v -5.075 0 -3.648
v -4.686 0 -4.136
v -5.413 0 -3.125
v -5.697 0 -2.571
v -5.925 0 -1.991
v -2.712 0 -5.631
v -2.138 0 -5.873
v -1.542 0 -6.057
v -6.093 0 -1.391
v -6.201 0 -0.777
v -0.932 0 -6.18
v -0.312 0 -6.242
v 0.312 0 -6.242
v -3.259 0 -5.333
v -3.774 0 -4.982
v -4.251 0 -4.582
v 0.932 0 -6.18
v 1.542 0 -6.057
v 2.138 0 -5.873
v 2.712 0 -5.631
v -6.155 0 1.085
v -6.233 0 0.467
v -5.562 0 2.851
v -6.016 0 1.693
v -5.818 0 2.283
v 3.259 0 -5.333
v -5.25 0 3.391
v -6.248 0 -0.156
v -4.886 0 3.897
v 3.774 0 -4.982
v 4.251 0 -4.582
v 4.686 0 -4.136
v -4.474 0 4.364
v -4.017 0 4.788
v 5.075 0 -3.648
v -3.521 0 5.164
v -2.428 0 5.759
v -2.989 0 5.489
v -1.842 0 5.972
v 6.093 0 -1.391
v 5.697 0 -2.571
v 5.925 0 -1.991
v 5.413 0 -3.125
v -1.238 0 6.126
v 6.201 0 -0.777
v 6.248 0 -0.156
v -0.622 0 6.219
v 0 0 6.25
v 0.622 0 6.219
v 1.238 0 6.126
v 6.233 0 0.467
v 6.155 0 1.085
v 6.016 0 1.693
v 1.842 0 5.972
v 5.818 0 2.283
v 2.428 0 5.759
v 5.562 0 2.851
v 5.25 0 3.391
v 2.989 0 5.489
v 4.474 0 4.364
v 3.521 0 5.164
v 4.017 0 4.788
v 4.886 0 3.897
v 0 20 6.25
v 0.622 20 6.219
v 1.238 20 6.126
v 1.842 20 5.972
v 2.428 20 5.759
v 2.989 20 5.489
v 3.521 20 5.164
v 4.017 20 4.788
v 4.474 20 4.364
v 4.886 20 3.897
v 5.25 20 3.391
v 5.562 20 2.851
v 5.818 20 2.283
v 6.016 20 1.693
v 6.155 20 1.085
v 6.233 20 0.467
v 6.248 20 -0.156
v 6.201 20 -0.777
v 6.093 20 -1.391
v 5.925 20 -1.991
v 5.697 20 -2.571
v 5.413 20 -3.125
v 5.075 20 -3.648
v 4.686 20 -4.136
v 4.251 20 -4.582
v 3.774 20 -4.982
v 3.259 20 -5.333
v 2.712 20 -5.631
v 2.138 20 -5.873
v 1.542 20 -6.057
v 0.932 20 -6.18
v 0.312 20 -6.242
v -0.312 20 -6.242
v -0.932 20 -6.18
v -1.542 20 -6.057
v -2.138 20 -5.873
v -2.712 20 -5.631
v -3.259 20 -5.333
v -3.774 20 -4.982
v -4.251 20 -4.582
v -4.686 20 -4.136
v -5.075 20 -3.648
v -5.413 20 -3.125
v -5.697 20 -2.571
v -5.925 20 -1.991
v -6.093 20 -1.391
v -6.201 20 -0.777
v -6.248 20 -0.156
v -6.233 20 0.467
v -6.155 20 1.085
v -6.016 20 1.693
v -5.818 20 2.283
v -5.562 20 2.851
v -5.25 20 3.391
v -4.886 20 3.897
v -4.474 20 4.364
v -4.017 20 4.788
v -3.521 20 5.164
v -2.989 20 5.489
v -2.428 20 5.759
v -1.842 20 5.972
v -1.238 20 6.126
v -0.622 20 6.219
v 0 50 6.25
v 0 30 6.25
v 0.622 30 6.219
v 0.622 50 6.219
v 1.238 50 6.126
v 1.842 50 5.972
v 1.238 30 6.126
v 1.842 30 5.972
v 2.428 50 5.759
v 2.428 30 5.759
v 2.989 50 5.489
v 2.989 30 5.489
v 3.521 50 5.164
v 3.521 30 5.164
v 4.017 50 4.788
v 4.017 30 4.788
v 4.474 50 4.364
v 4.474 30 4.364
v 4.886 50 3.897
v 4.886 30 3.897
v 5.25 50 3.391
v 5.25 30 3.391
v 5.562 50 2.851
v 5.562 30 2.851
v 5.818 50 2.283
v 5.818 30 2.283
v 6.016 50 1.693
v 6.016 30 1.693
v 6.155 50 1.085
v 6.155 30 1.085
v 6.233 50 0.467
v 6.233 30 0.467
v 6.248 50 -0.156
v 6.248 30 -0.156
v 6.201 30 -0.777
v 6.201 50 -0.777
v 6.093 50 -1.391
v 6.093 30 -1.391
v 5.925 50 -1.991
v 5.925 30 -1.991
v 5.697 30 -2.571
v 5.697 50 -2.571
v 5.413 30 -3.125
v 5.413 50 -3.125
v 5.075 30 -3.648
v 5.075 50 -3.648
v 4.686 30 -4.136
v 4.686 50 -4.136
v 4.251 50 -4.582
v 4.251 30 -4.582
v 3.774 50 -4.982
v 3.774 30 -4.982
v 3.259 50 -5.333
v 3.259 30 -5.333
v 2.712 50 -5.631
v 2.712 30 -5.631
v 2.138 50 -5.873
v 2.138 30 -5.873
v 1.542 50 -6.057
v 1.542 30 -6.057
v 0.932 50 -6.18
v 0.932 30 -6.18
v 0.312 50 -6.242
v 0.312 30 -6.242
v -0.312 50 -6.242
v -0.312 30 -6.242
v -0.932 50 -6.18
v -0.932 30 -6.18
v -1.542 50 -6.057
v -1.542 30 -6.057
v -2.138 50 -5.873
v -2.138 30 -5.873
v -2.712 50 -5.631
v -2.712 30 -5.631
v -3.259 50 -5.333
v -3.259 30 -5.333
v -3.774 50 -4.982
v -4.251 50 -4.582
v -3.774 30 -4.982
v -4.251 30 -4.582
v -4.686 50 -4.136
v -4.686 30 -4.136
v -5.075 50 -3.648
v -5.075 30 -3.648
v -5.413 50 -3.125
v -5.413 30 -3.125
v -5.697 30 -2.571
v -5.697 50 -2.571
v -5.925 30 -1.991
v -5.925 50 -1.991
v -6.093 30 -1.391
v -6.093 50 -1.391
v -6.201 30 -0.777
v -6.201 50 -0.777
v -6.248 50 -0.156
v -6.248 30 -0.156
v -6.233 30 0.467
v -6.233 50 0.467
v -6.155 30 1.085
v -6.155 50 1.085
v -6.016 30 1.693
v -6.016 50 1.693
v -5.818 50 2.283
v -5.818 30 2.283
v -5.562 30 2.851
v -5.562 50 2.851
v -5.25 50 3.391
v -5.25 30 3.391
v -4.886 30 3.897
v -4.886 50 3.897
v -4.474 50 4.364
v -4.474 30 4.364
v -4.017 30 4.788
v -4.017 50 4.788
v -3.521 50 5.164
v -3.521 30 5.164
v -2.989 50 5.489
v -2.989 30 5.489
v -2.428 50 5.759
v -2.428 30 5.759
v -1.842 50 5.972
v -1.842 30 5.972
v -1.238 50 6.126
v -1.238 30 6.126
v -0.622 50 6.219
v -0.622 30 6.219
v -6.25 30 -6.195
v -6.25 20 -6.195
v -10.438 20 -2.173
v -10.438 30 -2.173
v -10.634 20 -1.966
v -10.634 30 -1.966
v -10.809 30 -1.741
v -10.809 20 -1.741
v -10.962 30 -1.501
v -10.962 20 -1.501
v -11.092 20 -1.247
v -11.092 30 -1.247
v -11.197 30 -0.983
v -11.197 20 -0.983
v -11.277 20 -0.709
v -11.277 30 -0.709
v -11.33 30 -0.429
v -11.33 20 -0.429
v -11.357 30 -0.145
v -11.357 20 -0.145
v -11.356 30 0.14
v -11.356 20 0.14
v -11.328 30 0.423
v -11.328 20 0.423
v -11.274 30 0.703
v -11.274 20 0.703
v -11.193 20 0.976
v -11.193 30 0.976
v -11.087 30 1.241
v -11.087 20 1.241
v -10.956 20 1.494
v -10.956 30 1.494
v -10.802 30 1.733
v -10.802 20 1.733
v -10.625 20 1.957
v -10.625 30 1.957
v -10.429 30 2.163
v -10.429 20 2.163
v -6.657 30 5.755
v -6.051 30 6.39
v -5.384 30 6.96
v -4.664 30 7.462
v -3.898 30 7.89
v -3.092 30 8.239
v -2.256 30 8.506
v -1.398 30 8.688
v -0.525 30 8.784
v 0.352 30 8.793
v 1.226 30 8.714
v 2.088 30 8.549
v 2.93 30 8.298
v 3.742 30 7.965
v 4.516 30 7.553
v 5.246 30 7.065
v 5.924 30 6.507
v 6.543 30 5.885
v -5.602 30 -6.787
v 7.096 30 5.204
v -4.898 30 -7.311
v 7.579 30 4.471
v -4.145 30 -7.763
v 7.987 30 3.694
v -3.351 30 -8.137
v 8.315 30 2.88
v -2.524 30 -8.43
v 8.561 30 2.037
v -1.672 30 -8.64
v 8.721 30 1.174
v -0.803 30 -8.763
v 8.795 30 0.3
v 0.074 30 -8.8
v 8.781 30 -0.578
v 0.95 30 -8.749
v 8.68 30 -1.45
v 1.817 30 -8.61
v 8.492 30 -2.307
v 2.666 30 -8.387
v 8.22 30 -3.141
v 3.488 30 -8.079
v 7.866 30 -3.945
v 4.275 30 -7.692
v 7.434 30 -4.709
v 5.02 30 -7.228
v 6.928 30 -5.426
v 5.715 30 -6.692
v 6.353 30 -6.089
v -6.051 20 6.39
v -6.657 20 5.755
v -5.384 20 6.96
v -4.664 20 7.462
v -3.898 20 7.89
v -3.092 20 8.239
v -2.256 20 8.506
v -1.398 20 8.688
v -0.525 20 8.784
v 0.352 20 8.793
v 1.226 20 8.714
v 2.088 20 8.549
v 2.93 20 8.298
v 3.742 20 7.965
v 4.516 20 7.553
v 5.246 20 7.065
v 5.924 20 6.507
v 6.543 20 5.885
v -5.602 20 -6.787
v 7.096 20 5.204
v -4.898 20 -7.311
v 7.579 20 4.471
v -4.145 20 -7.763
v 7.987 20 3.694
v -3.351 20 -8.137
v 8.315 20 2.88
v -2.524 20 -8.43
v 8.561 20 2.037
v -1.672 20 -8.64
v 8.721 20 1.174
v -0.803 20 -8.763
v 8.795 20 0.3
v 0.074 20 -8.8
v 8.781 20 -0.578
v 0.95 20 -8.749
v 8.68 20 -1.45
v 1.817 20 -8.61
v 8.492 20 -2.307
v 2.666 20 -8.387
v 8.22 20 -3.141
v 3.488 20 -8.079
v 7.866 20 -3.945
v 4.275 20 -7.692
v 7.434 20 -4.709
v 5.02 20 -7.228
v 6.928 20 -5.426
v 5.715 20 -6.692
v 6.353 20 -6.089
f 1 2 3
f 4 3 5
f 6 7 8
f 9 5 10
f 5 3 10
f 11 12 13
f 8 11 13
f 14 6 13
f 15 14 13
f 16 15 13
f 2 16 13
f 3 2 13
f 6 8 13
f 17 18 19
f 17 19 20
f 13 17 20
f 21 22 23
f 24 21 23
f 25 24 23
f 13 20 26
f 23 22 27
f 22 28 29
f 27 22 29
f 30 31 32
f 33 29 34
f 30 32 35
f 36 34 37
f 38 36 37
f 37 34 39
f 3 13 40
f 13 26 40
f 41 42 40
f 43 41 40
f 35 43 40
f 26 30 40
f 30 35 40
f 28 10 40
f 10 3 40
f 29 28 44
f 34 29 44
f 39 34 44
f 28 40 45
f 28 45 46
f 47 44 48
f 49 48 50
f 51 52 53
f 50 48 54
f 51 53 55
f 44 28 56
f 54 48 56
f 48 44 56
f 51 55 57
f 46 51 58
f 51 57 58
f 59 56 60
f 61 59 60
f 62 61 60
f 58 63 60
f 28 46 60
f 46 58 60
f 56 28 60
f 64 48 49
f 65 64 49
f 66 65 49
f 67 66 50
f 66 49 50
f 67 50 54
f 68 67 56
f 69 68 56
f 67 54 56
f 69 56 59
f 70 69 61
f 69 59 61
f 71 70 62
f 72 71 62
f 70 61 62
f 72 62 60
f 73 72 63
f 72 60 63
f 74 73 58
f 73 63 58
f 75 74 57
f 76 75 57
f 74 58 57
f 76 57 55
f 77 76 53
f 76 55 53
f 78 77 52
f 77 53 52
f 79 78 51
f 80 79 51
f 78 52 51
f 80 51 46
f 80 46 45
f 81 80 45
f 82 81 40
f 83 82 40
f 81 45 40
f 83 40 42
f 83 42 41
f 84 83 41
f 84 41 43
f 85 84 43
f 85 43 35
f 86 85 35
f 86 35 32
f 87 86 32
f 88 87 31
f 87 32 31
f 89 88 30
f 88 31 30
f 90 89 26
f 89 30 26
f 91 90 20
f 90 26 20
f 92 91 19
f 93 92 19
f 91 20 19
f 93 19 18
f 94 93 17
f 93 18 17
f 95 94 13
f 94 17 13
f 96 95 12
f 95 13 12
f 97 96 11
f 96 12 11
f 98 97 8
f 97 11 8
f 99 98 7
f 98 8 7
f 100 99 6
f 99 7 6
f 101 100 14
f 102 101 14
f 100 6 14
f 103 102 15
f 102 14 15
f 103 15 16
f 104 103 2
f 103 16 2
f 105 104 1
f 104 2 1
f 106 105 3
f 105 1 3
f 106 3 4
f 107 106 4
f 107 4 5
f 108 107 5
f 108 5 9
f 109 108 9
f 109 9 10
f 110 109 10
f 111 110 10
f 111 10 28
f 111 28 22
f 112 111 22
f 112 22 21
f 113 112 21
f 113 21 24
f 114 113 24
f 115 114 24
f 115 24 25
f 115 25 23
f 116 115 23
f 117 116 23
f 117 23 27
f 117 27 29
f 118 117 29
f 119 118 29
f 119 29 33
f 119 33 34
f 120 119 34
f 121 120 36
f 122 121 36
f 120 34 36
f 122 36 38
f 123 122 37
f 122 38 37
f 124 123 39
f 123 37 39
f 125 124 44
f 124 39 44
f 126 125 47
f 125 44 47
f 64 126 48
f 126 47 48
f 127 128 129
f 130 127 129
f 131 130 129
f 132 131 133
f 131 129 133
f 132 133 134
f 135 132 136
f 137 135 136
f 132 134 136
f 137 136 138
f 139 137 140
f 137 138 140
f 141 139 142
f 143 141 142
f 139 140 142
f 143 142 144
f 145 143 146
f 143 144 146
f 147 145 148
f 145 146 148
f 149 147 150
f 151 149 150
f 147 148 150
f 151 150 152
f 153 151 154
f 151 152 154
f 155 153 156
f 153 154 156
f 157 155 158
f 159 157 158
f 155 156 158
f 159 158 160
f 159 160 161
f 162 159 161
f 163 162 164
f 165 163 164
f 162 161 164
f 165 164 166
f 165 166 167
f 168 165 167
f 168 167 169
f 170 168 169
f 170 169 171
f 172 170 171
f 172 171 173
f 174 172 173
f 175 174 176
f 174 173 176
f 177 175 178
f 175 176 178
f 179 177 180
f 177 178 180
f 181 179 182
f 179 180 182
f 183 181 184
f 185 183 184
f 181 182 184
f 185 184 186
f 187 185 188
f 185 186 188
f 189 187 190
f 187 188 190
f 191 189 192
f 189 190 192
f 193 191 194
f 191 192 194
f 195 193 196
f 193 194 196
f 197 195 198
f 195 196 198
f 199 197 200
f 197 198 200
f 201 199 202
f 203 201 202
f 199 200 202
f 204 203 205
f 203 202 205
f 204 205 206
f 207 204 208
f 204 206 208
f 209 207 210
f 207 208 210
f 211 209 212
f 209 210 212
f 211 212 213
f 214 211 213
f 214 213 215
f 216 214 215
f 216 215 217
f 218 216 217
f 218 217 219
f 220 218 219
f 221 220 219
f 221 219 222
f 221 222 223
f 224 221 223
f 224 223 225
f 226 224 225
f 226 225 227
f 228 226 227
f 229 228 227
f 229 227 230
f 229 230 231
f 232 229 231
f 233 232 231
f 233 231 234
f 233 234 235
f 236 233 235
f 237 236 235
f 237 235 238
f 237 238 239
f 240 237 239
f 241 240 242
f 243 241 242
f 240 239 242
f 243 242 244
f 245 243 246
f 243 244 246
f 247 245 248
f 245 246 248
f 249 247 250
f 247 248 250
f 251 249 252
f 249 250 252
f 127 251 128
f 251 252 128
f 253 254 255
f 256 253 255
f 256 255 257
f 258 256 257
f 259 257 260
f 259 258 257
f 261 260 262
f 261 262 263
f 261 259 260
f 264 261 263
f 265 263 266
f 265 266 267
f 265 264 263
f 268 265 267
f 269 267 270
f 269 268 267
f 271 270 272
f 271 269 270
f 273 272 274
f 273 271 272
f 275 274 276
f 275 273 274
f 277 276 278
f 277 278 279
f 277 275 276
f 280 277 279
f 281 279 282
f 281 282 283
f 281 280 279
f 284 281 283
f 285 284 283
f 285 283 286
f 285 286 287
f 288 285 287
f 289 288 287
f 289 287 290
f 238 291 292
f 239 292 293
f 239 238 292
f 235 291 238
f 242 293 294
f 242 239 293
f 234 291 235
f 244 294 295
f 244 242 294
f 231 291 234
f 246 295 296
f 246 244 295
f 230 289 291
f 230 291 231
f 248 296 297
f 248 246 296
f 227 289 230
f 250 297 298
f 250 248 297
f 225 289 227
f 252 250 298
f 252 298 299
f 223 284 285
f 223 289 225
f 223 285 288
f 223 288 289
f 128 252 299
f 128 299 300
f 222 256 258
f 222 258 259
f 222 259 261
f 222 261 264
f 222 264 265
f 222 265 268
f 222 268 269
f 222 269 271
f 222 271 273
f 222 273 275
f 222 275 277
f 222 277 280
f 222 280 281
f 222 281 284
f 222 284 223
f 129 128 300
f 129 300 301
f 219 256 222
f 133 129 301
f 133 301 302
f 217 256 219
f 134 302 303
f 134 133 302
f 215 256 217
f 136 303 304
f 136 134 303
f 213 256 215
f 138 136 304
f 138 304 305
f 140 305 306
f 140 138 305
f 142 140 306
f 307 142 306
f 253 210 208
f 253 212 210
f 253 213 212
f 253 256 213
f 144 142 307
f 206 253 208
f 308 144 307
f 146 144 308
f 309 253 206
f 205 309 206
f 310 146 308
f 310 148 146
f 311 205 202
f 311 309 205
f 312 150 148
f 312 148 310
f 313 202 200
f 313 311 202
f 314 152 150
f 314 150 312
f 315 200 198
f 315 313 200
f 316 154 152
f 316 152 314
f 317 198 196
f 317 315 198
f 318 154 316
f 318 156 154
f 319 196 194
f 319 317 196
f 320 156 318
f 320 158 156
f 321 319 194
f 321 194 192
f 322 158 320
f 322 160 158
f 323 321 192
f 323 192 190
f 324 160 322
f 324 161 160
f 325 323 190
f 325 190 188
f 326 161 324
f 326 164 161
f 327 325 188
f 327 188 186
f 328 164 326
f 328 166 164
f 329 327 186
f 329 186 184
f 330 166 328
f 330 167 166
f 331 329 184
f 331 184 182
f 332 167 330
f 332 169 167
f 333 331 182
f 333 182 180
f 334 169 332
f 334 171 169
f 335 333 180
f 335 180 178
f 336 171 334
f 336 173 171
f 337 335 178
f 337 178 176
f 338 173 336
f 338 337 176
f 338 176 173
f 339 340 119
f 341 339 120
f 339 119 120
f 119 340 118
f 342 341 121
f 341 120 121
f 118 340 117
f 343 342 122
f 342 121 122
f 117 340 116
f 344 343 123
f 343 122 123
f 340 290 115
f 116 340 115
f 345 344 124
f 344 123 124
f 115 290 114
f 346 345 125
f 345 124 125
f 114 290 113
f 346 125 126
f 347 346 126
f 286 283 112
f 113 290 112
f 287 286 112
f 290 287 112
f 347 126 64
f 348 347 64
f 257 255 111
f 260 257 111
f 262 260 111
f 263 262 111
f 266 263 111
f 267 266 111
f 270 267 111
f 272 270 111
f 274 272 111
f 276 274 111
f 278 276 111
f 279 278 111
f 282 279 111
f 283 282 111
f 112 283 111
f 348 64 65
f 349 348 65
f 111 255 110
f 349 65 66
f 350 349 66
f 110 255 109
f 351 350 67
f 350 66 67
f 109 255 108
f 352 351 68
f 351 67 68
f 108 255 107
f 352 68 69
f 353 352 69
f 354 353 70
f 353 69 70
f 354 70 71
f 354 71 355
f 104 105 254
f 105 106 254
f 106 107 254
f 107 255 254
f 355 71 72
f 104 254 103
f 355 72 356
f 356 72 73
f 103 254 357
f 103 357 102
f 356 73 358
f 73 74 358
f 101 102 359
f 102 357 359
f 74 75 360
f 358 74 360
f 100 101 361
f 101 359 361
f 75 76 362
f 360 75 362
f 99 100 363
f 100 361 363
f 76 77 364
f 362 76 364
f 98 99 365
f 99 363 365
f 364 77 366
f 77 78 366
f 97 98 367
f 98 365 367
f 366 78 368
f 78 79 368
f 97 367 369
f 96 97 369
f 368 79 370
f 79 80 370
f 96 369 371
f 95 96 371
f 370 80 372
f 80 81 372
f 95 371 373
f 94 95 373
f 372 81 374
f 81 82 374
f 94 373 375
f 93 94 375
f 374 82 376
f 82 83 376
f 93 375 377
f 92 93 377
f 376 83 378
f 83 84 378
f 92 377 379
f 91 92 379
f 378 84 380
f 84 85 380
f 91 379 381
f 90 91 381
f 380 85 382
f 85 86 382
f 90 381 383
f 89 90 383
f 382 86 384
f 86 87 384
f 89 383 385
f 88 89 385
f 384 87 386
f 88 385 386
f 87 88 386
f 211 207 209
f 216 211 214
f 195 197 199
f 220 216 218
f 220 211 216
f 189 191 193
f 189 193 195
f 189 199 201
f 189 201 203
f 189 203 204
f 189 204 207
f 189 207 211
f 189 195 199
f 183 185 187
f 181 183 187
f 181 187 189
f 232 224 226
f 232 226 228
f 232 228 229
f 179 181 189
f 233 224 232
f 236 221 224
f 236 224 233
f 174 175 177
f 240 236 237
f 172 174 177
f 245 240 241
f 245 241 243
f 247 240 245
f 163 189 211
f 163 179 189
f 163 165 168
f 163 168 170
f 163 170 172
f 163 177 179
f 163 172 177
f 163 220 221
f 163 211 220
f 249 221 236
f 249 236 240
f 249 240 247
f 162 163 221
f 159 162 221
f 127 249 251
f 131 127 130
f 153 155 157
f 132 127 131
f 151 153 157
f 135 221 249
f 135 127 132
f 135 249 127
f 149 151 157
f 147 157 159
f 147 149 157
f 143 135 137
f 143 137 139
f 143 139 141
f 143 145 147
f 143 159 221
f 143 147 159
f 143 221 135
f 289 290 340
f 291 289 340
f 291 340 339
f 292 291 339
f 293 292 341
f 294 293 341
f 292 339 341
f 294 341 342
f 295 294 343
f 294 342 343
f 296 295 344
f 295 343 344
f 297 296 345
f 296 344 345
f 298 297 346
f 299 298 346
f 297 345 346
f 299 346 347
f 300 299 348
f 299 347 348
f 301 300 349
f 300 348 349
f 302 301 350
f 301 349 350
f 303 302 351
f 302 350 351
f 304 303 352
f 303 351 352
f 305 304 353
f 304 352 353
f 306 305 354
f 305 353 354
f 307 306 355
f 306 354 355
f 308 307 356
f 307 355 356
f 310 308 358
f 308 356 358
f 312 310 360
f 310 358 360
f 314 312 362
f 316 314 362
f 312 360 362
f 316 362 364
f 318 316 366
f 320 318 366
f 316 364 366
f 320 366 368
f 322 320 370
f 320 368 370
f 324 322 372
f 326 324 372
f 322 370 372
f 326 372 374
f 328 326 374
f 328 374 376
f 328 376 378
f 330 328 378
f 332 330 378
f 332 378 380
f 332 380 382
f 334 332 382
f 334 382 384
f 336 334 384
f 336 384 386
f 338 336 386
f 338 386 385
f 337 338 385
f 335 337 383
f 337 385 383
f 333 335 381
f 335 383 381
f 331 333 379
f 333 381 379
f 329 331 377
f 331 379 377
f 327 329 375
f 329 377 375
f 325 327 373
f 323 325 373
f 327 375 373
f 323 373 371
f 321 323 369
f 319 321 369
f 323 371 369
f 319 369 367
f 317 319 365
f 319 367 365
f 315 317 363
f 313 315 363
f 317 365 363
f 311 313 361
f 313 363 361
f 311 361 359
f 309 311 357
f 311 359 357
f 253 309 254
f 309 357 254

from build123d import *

# Parameters (mm, degrees)
SCHIZZO1_R                   = 6.25
ESTRUSIONE_ESTRUSIONE1_DEPTH = 20
ESTRUSIONE_ESTRUSIONE2_DEPTH = 10
RACCORDO1_R                  = 3
SCHIZZO3_R                   = 6.25
ESTRUSIONE_ESTRUSIONE3_DEPTH = 20


with BuildPart() as part:
    # Schizzo1 → Estrusione-Estrusione1 (new body)
    with BuildSketch(Plane(origin=(0, 0, 0), x_dir=(1, 0, 0), z_dir=(0, 1, 0))):
        with Locations(Location((0, 0, 0), (0, 0, 270))):
            Circle(SCHIZZO1_R)
    extrude(amount=ESTRUSIONE_ESTRUSIONE1_DEPTH)

    # Schizzo2 → Estrusione-Estrusione2 (add)
    with BuildSketch(Plane(origin=(0, 20, 0), x_dir=(1, 0, 0), z_dir=(0, 1, 0))):
        with BuildLine():
            Line((-6.25, 6.194957627), (-12.7, 0))
            Line((-12.7, 0), (-6.657351546, -5.754969192))
            ThreePointArc((-6.657351546, -5.754969192), (8.794891627, -0.299802062), (-6.25, 6.194957627))
        make_face()
    extrude(amount=ESTRUSIONE_ESTRUSIONE2_DEPTH)

    # Raccordo1
    raccordo1_edges = [part.edges().sort_by_distance(p)[0] for p in [
        (-12.7, 25, 0),
    ]]
    fillet(raccordo1_edges, radius=RACCORDO1_R)

    # Schizzo3 → Estrusione-Estrusione3 (add)
    with BuildSketch(Plane(origin=(0, 30, 0), x_dir=(1, 0, 0), z_dir=(0, 1, 0))):
        with Locations(Location((0, 0, 0), (0, 0, 270))):
            Circle(SCHIZZO3_R)
    extrude(amount=ESTRUSIONE_ESTRUSIONE3_DEPTH)


solid = part.part
